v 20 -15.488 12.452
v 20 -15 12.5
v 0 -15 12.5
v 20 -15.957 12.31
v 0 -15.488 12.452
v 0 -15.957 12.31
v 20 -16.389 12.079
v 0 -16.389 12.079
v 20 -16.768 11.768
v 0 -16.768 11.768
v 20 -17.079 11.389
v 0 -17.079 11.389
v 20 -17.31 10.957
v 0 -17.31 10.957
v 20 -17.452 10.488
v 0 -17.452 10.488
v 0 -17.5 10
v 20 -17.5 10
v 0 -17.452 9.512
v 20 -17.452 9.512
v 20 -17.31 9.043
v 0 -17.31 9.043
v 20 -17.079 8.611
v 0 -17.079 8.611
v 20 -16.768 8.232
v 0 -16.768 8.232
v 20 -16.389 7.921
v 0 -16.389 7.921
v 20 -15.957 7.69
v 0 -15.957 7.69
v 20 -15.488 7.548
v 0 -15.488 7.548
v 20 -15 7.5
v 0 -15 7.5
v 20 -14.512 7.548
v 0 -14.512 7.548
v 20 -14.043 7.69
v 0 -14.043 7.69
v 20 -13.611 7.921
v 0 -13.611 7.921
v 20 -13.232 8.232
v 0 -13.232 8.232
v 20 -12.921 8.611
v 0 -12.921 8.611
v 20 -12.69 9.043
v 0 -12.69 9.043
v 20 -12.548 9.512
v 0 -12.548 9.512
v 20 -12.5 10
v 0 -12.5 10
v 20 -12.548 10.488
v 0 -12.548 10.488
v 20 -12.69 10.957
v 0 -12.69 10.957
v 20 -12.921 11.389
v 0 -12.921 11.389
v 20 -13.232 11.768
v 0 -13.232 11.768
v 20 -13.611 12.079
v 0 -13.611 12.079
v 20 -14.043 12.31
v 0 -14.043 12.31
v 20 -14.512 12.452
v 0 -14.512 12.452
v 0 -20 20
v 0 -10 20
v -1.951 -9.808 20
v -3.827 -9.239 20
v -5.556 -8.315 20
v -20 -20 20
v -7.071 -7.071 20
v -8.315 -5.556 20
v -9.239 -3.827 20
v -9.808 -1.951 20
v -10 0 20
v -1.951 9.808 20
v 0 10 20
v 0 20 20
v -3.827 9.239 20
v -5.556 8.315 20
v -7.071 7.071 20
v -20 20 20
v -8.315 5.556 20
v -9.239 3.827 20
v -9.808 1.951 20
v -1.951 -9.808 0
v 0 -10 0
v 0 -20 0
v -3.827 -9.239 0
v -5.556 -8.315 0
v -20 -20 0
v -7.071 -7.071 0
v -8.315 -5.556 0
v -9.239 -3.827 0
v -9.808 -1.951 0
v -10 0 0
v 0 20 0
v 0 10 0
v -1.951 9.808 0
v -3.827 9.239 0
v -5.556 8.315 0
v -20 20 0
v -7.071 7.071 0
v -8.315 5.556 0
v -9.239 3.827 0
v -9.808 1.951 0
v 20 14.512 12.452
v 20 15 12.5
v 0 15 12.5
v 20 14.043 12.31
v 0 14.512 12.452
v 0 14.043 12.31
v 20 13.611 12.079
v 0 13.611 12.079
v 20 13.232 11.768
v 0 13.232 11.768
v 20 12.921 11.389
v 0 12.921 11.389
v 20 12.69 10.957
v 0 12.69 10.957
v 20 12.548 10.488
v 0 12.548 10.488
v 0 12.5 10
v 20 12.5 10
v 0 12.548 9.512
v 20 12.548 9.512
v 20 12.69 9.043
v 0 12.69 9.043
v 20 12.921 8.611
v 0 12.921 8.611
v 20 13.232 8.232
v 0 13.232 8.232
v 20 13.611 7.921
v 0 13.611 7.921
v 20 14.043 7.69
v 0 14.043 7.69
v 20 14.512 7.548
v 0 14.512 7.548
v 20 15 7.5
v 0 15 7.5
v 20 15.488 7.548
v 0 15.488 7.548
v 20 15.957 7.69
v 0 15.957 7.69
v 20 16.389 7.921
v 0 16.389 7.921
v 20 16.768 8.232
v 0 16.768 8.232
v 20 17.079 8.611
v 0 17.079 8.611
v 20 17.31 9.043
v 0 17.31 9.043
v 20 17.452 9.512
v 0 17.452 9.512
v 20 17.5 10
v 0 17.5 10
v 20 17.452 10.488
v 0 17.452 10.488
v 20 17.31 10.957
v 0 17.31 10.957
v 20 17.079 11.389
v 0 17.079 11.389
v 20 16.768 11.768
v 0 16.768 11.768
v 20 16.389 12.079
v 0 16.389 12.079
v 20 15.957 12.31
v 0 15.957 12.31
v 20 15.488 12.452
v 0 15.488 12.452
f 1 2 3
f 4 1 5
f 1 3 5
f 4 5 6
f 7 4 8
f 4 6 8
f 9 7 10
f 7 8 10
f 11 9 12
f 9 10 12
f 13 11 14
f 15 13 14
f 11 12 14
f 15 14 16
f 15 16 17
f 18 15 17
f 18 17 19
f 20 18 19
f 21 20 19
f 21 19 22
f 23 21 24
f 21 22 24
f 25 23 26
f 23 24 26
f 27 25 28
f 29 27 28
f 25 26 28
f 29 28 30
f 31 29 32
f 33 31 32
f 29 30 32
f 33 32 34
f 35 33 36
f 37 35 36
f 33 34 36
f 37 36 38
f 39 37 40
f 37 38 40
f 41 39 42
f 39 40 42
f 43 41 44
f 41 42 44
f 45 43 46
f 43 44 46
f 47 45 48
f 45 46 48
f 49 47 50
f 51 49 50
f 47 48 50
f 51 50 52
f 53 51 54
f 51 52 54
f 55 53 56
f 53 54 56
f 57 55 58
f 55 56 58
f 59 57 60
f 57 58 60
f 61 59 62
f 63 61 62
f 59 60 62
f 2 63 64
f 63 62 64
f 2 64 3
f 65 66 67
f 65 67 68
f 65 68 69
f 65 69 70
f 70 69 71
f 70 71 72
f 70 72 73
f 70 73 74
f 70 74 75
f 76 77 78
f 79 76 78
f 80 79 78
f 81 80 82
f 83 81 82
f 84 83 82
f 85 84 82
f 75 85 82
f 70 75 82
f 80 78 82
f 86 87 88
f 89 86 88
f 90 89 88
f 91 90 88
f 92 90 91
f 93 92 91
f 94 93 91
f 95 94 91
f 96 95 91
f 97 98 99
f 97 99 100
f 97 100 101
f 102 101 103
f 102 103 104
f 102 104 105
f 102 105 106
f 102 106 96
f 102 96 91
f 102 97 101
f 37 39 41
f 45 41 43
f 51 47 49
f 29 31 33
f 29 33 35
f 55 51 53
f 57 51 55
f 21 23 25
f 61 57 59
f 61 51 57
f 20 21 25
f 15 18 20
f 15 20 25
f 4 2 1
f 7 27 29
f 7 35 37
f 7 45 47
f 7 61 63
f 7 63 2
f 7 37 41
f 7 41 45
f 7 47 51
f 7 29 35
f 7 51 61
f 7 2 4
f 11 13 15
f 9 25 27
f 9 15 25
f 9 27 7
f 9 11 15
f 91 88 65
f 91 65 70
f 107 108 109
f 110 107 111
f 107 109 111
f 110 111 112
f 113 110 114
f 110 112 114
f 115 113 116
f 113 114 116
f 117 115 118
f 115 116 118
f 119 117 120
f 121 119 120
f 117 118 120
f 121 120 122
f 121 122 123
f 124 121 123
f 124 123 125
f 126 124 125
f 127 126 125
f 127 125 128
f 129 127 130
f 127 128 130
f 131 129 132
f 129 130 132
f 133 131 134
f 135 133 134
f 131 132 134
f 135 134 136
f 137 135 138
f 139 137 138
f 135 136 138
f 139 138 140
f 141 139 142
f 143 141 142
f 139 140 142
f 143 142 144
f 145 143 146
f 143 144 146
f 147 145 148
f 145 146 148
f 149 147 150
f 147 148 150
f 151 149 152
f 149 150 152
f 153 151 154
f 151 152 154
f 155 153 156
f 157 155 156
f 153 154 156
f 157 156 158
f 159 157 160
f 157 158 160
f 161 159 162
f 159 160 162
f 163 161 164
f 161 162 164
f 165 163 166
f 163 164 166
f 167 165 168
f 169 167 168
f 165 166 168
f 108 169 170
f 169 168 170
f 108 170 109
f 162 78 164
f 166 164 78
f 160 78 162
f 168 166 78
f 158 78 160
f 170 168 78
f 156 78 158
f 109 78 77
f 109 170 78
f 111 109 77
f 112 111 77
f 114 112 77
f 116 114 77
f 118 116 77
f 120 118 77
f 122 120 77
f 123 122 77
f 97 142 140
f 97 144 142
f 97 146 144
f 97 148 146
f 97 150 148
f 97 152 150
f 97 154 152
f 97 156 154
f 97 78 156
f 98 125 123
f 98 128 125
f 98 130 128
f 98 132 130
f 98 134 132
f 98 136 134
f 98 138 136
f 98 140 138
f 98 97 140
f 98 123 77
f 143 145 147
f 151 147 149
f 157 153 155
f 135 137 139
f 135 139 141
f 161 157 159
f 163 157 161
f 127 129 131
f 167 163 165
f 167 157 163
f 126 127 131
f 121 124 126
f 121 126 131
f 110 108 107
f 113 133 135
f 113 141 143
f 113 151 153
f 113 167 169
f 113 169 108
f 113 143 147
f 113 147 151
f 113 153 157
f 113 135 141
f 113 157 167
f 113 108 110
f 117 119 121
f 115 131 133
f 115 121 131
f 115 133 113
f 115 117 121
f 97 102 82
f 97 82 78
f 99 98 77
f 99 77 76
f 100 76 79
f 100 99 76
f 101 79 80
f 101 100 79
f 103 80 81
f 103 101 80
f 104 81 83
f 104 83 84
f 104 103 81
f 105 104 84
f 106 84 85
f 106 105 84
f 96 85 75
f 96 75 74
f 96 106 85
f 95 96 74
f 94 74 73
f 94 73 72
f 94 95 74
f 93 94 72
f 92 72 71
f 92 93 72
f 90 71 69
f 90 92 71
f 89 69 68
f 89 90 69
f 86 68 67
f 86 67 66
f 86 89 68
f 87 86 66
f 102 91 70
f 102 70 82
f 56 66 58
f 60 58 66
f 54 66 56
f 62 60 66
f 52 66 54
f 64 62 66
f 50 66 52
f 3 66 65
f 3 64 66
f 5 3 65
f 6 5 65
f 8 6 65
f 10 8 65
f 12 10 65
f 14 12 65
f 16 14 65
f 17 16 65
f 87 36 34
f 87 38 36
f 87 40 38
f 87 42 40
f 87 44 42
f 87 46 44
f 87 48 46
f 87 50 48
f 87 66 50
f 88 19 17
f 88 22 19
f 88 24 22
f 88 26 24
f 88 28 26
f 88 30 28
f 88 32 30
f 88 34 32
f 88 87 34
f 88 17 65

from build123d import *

# Parameters (mm, degrees)
EXTRUDE_1_DEPTH = 20
SKETCH_3_R      = 2.5
EXTRUDE_2_DEPTH = 20


with BuildPart() as part:
    # 草图1 → 凸台-拉伸1 (new body)
    with BuildSketch(Plane.XY):
        with BuildLine():
            Line((0, 20), (0, 10))
            ThreePointArc((0, 10), (-10, 0), (0, -10))
            Line((0, -10), (0, -20))
            Line((0, -20), (-20, -20))
            Line((-20, -20), (-20, 20))
            Line((-20, 20), (0, 20))
        make_face()
    extrude(amount=EXTRUDE_1_DEPTH)

    # 草图3 → 凸台-拉伸2 (add)
    with BuildSketch(Plane(origin=(0, 0, 0), x_dir=(0, 0, -1), z_dir=(1, 0, 0))):
        with Locations(Location((-10, 15, 0), (0, 0, 180))):
            Circle(SKETCH_3_R)
        with Locations(Location((-10, -15, 0), (0, 0, 180))):
            Circle(SKETCH_3_R)
    extrude(amount=EXTRUDE_2_DEPTH)


solid = part.part
